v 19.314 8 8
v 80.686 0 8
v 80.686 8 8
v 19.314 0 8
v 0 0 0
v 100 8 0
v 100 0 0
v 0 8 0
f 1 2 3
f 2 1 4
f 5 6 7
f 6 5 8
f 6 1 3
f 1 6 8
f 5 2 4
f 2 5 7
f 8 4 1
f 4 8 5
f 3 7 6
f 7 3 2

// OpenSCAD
difference(){
    cube([100,8,8]);
    rotate([0,-22.5,0])
        cube([25,8,8]);
    translate([100,8,0])
        rotate([0,-22.5,180])
            cube([25,8,8]);
}
